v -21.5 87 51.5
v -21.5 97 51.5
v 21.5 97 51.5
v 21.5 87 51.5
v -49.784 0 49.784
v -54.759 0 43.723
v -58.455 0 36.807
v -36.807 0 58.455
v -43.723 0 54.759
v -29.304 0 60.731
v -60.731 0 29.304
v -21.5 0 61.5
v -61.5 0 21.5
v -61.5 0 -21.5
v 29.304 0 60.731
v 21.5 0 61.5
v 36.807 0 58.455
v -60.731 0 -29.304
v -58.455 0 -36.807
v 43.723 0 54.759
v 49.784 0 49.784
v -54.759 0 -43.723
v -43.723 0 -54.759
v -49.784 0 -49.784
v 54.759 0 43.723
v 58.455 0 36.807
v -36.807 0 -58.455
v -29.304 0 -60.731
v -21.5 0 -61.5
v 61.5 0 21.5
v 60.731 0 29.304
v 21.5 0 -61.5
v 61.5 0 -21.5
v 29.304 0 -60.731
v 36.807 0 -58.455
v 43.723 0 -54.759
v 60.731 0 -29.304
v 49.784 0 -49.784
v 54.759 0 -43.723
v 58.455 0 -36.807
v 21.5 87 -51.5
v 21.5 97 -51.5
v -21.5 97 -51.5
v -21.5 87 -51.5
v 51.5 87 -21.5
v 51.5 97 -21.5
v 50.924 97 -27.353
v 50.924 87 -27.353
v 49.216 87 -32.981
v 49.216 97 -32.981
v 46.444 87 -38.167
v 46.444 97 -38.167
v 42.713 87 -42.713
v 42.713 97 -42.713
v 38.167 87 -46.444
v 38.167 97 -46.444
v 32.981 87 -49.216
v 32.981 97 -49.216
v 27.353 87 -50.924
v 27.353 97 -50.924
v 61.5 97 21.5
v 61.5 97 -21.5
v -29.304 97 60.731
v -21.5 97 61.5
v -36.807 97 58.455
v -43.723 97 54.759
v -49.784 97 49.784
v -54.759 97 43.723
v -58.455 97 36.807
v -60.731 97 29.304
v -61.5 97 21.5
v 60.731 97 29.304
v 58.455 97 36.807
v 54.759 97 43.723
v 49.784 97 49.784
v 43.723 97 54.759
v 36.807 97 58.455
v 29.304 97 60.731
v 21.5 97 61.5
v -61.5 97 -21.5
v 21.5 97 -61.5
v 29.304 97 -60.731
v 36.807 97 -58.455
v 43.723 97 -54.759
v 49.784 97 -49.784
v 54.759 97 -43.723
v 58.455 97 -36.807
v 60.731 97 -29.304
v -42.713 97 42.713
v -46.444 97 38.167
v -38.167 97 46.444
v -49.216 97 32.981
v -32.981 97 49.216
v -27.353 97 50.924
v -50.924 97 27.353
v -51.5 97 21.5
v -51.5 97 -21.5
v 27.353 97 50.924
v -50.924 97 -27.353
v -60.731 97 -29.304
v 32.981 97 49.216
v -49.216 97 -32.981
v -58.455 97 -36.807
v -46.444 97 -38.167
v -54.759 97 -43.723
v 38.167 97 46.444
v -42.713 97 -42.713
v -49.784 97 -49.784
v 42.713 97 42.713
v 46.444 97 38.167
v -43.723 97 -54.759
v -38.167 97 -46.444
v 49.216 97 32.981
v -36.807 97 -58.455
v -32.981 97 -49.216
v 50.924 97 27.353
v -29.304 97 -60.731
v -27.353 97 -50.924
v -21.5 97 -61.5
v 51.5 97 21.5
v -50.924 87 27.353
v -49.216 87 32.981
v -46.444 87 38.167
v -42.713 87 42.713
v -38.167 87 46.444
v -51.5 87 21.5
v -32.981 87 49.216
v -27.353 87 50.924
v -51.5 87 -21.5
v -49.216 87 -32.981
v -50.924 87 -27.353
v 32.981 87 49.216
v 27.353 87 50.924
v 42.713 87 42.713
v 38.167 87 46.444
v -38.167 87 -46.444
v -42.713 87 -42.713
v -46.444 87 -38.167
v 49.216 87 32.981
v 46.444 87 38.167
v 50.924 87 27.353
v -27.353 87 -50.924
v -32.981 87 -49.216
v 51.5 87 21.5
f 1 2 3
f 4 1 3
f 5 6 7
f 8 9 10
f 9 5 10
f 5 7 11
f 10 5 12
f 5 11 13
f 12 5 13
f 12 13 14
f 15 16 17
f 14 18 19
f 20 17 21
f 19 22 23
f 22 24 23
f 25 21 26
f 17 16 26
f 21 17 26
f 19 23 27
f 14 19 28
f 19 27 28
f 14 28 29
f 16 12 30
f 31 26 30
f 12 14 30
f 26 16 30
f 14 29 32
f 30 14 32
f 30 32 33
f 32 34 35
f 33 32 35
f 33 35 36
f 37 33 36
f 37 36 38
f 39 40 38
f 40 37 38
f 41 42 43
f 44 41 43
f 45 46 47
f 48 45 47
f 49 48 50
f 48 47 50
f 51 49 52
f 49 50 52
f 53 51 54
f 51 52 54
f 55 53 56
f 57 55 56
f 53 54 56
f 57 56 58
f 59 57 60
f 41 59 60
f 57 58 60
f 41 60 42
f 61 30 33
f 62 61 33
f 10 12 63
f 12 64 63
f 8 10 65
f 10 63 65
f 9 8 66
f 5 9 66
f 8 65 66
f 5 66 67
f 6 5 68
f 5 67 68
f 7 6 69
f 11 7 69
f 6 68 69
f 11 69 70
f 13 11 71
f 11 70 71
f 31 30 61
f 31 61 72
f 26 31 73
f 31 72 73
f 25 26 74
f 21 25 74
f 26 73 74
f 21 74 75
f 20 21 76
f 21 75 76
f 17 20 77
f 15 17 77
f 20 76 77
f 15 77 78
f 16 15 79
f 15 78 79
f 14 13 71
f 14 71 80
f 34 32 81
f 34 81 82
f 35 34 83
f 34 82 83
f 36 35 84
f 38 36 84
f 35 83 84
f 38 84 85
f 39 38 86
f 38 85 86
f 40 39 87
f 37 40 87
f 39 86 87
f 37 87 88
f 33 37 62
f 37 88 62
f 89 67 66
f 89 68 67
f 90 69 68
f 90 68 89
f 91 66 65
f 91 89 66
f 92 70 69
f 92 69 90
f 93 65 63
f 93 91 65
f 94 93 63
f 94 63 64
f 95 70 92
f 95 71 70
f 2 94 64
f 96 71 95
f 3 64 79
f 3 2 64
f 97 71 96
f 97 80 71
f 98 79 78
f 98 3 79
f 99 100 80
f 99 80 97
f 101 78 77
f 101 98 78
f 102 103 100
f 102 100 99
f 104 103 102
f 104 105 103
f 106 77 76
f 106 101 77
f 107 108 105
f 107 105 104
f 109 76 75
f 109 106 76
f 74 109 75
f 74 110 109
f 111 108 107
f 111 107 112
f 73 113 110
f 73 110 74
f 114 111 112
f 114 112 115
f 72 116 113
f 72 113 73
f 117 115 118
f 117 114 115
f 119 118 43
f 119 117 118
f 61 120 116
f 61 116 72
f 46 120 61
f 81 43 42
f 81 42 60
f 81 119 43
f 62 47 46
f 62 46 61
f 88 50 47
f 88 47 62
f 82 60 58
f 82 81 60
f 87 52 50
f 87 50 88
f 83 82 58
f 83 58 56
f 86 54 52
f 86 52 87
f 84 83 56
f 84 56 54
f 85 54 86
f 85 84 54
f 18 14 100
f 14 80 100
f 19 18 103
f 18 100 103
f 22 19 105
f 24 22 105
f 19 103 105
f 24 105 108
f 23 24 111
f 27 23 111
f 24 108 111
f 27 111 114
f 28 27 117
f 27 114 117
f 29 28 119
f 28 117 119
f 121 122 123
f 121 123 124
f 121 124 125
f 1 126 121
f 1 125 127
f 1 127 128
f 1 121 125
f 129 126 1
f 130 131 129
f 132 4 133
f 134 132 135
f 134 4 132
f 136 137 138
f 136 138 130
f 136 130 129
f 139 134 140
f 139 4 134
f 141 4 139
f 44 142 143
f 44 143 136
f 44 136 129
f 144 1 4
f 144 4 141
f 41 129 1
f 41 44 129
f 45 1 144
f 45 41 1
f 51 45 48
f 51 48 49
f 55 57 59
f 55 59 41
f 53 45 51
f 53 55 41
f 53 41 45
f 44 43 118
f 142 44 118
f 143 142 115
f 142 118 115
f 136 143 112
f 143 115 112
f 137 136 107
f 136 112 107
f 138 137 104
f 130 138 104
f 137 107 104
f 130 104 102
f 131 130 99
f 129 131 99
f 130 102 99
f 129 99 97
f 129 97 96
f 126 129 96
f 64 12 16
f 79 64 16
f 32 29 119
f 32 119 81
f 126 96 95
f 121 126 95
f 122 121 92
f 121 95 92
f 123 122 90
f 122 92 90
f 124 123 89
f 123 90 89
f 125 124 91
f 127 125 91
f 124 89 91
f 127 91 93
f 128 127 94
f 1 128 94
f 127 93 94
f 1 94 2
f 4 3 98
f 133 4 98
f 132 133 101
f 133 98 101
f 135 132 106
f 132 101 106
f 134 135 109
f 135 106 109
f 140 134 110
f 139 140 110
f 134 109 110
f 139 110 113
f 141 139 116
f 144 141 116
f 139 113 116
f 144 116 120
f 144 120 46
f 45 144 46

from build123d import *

# Parameters (mm, degrees)
SKETCH_1_W          = 123
SKETCH_1_H          = 123
EXTRUDE_1_DEPTH     = 97
FILLET_1_R          = 40
FILLET_2_R          = 40
FILLET_3_R          = 40
FILLET_4_R          = 40
CUT_EXTRUDE_1_DEPTH = 10


with BuildPart() as part:
    # 스케치1 → 보스-돌출1 (new body)
    with BuildSketch(Plane(origin=(0, 0, 0), x_dir=(1, 0, 0), z_dir=(0, 1, 0))):
        Rectangle(SKETCH_1_W, SKETCH_1_H)
    extrude(amount=EXTRUDE_1_DEPTH)

    # 필렛1
    fillet_1_edges = [part.edges().sort_by_distance(p)[0] for p in [
        (-61.5, 48.5, -61.5),
    ]]
    fillet(fillet_1_edges, radius=FILLET_1_R)

    # 필렛2
    fillet_2_edges = [part.edges().sort_by_distance(p)[0] for p in [
        (61.5, 48.5, -61.5),
    ]]
    fillet(fillet_2_edges, radius=FILLET_2_R)

    # 필렛3
    fillet_3_edges = [part.edges().sort_by_distance(p)[0] for p in [
        (61.5, 48.5, 61.5),
    ]]
    fillet(fillet_3_edges, radius=FILLET_3_R)

    # 필렛4
    fillet_4_edges = [part.edges().sort_by_distance(p)[0] for p in [
        (-61.5, 48.5, 61.5),
    ]]
    fillet(fillet_4_edges, radius=FILLET_4_R)

    # 스케치2 → 컷-돌출1 (cut)
    with BuildSketch(Plane(origin=(0, 97, 0), x_dir=(1, 0, 0), z_dir=(0, 1, 0))):
        with BuildLine():
            Line((21.5, 51.5), (-21.5, 51.5))
            ThreePointArc((-21.5, 51.5), (-42.713203436, 42.713203436), (-51.5, 21.5))
            Line((-51.5, 21.5), (-51.5, -21.5))
            ThreePointArc((-51.5, -21.5), (-42.713203436, -42.713203436), (-21.5, -51.5))
            Line((-21.5, -51.5), (21.5, -51.5))
            ThreePointArc((21.5, -51.5), (42.713203436, -42.713203436), (51.5, -21.5))
            Line((51.5, -21.5), (51.5, 21.5))
            ThreePointArc((51.5, 21.5), (42.713203436, 42.713203436), (21.5, 51.5))
        make_face()
    extrude(amount=-CUT_EXTRUDE_1_DEPTH, mode=Mode.SUBTRACT)


solid = part.part
